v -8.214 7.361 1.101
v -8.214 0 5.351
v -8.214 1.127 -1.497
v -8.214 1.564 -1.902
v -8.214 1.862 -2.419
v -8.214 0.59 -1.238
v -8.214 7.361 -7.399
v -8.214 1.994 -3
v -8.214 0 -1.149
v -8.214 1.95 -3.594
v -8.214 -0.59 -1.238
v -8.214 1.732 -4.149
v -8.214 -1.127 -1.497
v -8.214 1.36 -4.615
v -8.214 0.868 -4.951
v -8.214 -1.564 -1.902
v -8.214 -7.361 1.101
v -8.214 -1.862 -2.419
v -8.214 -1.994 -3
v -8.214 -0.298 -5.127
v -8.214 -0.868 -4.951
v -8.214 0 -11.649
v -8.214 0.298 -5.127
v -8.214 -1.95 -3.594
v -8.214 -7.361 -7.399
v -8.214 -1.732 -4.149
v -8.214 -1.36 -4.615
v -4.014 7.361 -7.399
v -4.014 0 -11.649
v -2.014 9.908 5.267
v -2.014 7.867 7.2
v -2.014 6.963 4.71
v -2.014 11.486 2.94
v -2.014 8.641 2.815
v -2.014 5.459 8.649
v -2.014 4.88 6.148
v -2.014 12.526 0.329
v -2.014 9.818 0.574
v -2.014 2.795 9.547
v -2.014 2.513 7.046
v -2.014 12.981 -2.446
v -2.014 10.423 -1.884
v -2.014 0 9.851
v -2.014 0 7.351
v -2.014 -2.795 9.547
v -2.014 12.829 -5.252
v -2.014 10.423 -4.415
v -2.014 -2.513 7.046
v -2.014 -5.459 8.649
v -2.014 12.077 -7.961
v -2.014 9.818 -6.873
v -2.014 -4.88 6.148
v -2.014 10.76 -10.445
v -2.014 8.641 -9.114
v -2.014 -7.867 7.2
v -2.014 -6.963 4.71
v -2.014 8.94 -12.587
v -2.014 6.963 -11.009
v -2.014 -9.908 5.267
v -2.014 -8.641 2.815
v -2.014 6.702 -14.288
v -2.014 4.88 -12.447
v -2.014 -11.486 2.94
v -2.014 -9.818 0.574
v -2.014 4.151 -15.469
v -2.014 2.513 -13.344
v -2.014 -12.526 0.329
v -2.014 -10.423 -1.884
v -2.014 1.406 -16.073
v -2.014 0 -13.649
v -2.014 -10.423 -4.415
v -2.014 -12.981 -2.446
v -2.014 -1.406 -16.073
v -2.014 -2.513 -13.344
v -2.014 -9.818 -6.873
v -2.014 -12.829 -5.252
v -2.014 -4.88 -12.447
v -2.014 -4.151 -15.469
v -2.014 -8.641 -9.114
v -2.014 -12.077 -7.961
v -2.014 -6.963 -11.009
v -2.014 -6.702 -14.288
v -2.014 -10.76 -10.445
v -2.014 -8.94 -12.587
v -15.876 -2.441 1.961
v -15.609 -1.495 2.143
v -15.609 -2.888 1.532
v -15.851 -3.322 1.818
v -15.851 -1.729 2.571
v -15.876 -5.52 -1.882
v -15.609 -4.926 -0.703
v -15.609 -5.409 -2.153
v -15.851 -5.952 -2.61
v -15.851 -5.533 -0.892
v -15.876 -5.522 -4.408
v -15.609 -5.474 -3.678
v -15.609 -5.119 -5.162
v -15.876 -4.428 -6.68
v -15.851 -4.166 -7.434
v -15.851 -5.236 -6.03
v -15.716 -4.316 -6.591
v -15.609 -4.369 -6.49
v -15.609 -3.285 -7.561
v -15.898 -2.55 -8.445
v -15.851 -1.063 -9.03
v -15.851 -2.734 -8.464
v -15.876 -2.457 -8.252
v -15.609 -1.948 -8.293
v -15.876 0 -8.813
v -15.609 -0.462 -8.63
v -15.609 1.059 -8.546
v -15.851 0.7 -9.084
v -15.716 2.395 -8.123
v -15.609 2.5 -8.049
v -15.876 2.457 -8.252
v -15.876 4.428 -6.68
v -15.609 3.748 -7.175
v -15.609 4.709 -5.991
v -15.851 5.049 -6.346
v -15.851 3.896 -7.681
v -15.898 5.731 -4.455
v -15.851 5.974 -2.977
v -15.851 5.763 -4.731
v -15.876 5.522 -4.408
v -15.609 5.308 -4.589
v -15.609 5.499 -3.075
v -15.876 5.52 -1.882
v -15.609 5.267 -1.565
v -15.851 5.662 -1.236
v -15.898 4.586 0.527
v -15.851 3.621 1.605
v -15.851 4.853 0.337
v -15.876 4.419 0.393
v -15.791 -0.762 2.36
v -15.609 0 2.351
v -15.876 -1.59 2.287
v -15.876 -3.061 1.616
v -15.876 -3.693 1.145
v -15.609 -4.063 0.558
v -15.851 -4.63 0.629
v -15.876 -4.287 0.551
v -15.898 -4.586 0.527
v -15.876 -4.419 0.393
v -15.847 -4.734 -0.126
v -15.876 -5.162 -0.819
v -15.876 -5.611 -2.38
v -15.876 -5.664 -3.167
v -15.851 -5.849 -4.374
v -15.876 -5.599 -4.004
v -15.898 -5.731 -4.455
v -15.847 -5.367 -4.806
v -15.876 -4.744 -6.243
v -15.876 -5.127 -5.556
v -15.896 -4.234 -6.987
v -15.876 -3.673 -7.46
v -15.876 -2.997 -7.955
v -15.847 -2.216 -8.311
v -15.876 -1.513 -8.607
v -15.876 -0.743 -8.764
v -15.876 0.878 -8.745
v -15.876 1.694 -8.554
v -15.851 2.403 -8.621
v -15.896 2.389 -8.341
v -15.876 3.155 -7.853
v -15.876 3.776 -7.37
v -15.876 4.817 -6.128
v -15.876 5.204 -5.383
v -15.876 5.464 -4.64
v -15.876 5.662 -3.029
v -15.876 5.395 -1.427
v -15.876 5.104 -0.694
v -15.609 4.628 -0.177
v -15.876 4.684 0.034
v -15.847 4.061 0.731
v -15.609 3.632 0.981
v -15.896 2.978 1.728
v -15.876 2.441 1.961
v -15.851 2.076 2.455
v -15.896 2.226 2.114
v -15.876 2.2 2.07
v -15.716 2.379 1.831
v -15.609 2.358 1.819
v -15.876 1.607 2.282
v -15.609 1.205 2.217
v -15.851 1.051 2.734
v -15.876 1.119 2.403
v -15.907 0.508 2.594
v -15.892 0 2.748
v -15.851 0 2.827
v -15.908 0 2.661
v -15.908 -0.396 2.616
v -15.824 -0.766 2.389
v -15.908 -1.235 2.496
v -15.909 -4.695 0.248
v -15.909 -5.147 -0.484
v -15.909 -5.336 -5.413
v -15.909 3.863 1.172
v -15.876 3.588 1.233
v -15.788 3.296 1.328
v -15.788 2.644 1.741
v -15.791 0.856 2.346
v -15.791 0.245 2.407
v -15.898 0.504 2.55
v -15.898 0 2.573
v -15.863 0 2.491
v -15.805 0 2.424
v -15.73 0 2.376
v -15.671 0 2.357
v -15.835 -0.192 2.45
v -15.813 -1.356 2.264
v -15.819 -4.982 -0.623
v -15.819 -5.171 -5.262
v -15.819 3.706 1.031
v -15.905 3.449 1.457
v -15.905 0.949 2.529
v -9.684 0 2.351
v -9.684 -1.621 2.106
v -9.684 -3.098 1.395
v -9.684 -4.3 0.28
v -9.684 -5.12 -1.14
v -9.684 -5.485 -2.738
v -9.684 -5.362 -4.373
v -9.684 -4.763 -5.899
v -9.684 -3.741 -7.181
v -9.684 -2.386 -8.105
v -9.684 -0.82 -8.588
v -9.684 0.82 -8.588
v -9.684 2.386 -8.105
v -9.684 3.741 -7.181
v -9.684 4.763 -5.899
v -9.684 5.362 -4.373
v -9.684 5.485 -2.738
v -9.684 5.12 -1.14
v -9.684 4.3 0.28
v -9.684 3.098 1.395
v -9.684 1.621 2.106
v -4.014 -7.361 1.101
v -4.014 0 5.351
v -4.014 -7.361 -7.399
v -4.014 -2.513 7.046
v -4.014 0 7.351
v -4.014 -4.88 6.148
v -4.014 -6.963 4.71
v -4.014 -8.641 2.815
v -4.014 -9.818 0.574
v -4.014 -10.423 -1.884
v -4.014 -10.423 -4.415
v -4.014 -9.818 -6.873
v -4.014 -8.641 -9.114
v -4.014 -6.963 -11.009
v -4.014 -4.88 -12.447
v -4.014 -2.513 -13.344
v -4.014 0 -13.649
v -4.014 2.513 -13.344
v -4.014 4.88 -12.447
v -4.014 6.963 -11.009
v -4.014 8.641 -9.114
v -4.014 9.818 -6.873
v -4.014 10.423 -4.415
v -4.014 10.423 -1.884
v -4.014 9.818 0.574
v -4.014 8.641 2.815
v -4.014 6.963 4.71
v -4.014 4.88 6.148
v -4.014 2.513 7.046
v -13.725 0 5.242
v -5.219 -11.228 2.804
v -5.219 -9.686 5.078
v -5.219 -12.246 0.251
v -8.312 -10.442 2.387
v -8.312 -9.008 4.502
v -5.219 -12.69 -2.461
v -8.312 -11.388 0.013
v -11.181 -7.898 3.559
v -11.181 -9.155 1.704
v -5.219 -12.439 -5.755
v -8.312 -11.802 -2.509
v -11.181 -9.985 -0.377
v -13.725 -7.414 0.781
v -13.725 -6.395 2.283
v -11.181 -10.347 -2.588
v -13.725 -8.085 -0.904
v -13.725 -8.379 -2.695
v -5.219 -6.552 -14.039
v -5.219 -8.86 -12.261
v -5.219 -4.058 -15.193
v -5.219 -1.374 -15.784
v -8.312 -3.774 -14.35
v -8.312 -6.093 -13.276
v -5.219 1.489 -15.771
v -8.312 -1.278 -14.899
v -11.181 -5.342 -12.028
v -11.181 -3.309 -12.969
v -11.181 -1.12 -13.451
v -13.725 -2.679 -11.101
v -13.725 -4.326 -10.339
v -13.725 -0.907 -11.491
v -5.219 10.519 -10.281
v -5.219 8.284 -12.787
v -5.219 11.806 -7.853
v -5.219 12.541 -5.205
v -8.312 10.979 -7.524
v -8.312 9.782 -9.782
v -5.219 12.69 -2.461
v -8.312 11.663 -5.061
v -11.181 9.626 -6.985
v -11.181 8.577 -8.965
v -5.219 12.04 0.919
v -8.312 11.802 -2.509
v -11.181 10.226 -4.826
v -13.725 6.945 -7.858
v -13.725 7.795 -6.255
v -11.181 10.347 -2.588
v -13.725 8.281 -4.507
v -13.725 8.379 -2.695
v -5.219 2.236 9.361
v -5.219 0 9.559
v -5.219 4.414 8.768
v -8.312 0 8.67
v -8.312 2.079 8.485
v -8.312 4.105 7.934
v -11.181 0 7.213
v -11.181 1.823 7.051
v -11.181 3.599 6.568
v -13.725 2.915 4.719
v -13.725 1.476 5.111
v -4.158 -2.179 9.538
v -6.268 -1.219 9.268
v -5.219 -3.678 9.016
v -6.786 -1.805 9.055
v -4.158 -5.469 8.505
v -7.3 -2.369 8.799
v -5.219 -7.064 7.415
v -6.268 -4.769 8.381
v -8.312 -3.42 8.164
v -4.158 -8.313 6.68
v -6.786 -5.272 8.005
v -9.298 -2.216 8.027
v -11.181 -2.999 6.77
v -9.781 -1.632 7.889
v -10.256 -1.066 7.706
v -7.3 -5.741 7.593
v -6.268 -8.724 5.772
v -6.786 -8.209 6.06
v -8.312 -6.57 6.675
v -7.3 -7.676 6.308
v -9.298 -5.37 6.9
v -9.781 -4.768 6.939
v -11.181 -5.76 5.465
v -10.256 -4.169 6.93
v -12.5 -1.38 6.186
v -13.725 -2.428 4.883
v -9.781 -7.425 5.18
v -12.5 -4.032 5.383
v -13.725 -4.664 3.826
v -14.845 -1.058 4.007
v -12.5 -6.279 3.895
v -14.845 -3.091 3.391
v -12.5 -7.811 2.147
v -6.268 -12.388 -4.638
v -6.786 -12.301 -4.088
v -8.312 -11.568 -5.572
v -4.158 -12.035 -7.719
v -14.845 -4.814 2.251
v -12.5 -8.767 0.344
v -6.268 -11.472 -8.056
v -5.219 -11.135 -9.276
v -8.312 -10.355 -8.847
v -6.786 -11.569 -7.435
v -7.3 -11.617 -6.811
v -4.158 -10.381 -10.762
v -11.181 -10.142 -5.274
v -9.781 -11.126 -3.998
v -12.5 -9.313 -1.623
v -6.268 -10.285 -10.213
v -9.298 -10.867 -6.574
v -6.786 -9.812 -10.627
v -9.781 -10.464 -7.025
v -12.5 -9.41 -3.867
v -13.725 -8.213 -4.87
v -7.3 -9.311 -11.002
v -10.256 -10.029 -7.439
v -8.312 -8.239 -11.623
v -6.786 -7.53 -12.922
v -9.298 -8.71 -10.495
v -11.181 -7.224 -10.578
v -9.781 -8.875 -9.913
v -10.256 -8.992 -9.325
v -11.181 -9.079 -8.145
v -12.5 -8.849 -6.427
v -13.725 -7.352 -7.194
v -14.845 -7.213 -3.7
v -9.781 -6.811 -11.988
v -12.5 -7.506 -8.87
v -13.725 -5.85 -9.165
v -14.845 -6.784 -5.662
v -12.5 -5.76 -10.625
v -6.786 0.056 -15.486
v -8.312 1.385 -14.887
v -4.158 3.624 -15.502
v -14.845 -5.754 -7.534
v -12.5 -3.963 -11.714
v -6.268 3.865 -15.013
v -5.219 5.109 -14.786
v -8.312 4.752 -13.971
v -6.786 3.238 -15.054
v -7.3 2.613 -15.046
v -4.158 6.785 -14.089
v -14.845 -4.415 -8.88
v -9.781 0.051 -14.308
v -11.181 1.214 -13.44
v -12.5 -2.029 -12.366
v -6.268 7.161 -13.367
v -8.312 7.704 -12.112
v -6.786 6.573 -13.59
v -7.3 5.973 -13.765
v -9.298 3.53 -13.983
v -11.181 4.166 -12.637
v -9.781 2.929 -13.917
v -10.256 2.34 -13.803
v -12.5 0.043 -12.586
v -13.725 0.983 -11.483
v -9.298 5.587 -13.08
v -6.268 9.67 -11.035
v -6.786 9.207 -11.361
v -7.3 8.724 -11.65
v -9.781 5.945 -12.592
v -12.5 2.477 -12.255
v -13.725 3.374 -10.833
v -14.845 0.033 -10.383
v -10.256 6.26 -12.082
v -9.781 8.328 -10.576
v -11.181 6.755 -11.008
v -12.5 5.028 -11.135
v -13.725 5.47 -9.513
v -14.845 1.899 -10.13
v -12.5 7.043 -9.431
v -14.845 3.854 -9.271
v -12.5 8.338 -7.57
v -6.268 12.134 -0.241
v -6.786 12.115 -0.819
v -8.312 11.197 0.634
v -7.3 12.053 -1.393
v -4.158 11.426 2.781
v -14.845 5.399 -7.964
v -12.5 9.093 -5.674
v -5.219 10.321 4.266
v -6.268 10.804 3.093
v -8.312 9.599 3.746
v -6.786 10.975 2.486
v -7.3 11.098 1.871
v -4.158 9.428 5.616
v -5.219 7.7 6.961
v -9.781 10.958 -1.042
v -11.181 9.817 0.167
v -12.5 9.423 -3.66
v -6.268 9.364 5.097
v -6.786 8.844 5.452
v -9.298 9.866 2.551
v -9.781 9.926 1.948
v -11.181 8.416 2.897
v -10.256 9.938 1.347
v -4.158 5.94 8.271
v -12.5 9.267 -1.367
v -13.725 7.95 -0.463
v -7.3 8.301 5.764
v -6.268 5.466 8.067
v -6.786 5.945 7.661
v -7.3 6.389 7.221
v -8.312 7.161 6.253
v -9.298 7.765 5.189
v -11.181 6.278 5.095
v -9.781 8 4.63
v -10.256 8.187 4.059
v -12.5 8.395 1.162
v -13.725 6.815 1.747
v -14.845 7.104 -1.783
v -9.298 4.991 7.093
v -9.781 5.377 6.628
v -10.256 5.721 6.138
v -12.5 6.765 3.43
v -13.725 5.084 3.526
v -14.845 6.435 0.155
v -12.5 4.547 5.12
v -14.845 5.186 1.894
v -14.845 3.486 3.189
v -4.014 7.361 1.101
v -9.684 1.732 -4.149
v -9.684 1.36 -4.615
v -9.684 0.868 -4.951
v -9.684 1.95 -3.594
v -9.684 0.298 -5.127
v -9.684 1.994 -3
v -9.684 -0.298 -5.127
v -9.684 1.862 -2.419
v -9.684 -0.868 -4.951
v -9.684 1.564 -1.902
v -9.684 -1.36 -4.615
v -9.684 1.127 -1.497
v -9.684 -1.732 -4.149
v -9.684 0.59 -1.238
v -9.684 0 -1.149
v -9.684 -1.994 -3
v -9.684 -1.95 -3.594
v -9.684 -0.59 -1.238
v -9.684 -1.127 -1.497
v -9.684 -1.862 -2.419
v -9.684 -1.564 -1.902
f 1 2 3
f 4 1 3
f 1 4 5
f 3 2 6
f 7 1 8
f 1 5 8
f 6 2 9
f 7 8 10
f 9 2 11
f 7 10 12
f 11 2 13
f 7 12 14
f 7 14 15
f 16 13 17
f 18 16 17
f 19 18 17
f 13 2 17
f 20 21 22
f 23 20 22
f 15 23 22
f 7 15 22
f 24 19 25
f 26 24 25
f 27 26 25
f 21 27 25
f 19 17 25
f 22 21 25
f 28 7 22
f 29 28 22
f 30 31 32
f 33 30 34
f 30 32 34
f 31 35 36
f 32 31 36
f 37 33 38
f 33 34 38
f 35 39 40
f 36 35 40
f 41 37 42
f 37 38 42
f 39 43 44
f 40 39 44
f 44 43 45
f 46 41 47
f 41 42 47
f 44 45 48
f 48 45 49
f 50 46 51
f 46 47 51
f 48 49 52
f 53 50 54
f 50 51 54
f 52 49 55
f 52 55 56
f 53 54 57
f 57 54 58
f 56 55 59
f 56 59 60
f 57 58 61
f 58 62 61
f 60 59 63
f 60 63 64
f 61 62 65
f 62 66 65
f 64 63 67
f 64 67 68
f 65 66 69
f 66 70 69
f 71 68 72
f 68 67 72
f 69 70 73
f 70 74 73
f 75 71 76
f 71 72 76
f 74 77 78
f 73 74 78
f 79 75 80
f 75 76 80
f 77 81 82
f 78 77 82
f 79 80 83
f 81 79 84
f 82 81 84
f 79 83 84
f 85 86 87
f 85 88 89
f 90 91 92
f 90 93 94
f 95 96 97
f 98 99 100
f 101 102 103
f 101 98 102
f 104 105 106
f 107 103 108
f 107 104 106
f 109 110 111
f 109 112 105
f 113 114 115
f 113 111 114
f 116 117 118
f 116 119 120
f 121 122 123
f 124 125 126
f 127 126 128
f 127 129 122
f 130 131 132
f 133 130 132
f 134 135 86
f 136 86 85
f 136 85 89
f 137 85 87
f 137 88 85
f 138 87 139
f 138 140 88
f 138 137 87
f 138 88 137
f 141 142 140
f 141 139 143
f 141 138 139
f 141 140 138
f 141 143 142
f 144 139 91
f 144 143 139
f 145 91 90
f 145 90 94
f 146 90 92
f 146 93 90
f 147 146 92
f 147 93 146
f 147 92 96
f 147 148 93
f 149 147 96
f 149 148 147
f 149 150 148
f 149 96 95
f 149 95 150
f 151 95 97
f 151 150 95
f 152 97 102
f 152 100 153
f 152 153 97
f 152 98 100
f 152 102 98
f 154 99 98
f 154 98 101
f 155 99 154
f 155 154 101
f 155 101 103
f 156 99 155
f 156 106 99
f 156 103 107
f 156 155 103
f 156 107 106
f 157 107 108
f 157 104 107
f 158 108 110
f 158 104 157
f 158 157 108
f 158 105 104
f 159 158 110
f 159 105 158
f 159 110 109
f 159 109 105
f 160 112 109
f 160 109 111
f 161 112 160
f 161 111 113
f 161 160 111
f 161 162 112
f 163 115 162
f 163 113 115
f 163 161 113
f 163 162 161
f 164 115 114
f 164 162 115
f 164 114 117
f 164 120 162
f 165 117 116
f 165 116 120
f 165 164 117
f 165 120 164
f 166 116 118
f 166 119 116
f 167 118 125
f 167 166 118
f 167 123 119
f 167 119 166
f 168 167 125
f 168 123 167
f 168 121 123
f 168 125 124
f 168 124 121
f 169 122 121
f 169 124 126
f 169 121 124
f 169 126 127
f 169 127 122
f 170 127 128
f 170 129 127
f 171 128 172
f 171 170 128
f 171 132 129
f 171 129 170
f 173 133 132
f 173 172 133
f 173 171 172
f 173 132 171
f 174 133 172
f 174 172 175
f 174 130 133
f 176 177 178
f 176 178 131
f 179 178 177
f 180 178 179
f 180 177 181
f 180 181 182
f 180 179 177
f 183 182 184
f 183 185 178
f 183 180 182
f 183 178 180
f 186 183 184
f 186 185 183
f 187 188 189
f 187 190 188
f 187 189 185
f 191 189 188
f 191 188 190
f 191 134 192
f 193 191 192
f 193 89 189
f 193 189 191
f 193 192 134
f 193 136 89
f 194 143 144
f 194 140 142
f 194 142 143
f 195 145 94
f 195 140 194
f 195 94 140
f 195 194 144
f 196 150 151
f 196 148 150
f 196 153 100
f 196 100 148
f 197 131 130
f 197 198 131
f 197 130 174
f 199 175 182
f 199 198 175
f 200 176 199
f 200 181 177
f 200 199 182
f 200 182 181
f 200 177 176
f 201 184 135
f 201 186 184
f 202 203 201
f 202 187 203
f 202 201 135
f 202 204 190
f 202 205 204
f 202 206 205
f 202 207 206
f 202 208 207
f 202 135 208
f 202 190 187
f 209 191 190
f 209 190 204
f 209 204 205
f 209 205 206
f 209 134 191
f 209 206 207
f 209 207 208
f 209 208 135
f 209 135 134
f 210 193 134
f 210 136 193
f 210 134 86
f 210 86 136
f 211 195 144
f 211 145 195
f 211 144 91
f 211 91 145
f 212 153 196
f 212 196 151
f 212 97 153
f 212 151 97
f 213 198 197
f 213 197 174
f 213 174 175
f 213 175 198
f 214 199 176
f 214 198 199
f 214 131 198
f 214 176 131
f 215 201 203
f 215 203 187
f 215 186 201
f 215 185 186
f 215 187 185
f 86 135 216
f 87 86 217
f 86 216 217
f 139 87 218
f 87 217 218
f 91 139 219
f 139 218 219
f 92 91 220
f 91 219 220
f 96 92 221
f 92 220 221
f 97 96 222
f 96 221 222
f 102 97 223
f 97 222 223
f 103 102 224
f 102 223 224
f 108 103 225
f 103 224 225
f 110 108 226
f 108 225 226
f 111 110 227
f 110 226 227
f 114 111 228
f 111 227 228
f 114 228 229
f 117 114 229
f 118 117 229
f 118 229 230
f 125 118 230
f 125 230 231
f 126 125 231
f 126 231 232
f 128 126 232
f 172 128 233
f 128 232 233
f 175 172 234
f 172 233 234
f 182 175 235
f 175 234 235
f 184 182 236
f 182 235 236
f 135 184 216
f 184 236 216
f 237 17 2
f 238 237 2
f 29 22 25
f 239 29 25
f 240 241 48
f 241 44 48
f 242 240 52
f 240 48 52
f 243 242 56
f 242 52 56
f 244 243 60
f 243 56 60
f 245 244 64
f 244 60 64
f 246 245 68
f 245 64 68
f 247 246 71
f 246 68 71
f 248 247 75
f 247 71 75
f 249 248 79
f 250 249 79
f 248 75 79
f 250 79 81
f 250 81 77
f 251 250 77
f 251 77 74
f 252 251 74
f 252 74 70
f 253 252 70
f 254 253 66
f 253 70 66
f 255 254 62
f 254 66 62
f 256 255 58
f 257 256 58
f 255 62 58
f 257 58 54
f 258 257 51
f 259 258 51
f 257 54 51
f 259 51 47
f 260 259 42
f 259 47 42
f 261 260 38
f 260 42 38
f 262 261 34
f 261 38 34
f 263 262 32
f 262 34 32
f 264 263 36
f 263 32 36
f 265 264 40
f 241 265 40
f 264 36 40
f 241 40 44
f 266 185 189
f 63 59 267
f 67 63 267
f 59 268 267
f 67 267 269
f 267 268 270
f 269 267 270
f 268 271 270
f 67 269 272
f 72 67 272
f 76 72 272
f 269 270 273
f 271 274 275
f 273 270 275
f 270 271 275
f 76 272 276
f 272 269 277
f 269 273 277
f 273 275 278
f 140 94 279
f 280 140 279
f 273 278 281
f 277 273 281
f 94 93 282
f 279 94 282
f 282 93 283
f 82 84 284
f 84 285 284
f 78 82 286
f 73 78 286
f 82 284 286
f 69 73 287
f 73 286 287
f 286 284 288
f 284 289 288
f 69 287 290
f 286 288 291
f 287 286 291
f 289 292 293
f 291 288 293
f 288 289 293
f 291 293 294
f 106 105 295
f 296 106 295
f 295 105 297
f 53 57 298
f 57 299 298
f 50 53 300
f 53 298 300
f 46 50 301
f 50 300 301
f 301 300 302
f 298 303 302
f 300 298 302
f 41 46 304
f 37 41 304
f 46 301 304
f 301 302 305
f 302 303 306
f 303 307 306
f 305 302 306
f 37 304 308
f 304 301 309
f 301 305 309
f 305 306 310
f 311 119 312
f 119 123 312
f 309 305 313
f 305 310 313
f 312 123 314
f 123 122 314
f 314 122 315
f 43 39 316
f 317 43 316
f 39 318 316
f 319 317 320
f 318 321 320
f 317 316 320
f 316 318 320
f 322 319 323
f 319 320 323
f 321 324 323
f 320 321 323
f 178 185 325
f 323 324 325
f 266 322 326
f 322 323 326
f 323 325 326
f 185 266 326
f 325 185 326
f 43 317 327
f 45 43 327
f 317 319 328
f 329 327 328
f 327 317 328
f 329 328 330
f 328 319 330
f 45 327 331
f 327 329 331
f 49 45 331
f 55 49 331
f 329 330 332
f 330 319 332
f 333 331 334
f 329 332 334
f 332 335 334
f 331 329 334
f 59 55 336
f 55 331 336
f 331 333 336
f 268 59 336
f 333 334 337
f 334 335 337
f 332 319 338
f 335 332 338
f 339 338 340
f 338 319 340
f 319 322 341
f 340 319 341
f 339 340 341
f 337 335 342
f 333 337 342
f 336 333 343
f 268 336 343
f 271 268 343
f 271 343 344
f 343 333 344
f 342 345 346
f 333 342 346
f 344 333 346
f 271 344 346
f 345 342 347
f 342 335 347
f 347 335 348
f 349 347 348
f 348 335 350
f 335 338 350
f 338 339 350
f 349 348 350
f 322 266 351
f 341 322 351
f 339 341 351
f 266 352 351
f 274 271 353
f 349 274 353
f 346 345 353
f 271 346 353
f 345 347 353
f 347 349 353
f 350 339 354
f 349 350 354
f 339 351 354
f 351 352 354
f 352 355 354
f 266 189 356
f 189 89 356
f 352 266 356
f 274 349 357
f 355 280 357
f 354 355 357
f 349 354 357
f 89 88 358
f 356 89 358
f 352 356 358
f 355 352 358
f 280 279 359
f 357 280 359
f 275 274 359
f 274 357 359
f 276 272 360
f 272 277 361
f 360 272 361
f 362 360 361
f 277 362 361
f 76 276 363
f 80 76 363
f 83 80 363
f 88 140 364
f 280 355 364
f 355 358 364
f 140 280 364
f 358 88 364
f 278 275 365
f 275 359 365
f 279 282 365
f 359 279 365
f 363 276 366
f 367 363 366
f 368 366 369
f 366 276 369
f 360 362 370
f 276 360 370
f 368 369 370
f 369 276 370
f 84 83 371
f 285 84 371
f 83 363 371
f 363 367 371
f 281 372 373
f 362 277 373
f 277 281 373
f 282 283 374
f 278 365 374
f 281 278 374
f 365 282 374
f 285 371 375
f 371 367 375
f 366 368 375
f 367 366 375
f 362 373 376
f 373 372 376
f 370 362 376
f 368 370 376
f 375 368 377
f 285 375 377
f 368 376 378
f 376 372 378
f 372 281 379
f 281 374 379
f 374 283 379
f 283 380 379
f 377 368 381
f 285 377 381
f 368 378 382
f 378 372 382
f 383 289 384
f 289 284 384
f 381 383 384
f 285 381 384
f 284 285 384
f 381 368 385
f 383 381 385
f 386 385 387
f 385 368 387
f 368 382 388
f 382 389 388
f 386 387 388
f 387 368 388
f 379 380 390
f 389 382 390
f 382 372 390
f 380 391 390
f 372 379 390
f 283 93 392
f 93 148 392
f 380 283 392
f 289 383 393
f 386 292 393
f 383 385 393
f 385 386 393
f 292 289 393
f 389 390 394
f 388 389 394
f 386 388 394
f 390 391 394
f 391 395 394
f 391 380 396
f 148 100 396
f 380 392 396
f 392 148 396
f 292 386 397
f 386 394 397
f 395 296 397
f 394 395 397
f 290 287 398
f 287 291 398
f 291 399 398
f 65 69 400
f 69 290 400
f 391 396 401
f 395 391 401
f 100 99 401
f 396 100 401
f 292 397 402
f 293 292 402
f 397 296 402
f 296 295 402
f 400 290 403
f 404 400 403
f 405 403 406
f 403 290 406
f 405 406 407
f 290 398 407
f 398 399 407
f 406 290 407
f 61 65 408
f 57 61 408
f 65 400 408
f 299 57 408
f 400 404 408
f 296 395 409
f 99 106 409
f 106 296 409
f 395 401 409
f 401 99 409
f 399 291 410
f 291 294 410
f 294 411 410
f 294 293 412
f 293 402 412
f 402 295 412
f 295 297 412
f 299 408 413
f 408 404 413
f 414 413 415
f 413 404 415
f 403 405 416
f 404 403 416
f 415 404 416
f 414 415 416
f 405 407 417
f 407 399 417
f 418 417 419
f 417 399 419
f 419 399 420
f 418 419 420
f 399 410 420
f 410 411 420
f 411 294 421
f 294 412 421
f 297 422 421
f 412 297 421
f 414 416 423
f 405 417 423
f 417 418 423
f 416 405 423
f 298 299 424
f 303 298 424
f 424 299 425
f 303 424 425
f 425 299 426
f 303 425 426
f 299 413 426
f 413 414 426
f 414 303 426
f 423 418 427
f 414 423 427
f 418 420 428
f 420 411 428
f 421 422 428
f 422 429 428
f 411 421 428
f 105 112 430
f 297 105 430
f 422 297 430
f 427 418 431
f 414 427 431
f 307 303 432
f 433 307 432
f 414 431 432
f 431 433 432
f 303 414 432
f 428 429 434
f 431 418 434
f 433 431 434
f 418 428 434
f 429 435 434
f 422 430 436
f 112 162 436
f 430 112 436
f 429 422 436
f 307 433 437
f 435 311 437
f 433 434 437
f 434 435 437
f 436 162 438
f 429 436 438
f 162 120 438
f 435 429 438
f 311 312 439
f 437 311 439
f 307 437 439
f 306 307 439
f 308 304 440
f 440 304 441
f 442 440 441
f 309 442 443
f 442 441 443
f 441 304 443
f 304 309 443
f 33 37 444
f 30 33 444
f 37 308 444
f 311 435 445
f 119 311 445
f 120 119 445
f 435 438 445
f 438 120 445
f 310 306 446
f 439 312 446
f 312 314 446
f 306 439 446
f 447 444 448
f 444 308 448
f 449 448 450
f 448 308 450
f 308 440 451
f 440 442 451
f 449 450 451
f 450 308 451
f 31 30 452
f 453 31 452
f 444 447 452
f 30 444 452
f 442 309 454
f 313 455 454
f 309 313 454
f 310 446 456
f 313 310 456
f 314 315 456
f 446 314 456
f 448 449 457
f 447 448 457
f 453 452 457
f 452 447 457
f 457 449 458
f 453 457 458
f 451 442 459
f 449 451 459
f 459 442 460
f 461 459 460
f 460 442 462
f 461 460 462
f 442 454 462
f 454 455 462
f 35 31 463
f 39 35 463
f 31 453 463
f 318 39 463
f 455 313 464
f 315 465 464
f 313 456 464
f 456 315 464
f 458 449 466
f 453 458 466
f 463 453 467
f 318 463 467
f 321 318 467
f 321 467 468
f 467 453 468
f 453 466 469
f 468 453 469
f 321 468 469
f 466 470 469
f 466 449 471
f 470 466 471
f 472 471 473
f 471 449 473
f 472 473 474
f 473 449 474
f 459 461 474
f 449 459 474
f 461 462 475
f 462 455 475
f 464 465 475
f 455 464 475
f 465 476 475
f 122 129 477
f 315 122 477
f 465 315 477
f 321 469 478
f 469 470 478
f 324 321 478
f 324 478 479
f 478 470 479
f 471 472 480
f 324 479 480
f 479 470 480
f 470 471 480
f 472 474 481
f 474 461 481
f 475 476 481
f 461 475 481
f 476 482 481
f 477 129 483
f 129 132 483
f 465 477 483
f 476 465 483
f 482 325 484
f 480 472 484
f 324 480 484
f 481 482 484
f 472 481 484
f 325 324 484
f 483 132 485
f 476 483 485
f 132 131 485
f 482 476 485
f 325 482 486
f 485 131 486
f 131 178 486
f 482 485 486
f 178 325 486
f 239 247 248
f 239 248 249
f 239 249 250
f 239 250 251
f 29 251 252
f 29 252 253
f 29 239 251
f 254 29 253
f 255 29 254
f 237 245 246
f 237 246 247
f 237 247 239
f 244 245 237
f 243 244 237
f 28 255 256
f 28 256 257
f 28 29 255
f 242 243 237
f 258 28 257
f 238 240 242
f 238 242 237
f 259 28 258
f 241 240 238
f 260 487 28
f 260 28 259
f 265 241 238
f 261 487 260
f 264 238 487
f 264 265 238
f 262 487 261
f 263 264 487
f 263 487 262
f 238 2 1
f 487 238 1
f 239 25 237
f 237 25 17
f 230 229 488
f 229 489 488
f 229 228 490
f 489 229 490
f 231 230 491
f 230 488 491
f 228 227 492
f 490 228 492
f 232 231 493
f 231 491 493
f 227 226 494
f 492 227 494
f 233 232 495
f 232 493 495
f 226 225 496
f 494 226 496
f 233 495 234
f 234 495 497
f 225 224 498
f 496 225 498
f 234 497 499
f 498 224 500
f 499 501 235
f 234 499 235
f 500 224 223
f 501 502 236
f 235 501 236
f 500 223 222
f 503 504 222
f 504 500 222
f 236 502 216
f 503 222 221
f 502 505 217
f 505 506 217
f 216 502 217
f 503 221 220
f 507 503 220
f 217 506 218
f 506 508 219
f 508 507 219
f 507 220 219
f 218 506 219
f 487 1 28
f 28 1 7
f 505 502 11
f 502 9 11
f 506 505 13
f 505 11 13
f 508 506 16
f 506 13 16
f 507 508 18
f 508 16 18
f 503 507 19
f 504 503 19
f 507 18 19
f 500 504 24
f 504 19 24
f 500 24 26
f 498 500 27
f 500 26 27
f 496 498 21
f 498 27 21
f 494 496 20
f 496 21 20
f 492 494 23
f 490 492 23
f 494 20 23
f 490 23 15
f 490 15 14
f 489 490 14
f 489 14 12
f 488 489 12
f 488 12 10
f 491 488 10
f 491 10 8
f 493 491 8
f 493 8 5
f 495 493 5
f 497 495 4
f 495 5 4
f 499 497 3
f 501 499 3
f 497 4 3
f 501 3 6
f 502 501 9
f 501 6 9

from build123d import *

# Parameters (mm, degrees)
F2_R     = 0.3
F4_DEPTH = 4.2


with BuildPart() as f1:
    # F0 (on Front) → F1 (revolve)
    with BuildSketch(Plane.XZ):
        with BuildLine():
            ThreePointArc((-2.0143112539, 9.8506723092), (-10.0387856326, 7.8756525688), (-16.1843112539, 2.3506723092))
            Line((-16.1843112539, 2.3506723092), (-9.6843112539, 2.3506723092))
            Line((-9.6843112539, 2.3506723092), (-9.6843112539, -1.1493276908))
            Line((-9.6843112539, -1.1493276908), (-8.2143112539, -1.1493276908))
            Line((-8.2143112539, -1.1493276908), (-8.2143112539, 5.3506723092))
            Line((-8.2143112539, 5.3506723092), (-4.0143112539, 5.3506723092))
            Line((-4.0143112539, 5.3506723092), (-4.0143112539, 7.3506723092))
            Line((-4.0143112539, 7.3506723092), (-2.0143112539, 7.3506723092))
            Line((-2.0143112539, 7.3506723092), (-2.0143112539, 9.8506723092))
        make_face()
    revolve(axis=Axis((-7.483886322, 0, -3.1493276908), (1, 0, 0)))

    # F2
    f2_edges = [f1.edges().sort_by_distance(p)[0] for p in [
        (-16.184311, 0, -8.649328),
    ]]
    fillet(f2_edges, radius=F2_R)

    # F3 (on face) → F4 (join)
    with BuildSketch(Plane.YZ.offset(-8.2143112539)):
        with BuildLine():
            Line((-7.3612159322, 1.1006723092), (0, 5.3506723092))
            ThreePointArc((0, 5.3506723092), (-4.25, 4.2118882414), (-7.3612159322, 1.1006723092))
        make_face()
        with BuildLine():
            Line((0, 5.3506723092), (7.3612159322, 1.1006723092))
            ThreePointArc((7.3612159322, 1.1006723092), (4.25, 4.2118882414), (0, 5.3506723092))
        make_face()
        with BuildLine():
            ThreePointArc((7.3612159322, -7.3993276908), (8.2103695235, -5.3492895741), (8.5, -3.1493276908))
            ThreePointArc((8.5, -3.1493276908), (8.2103695235, -0.9493658074), (7.3612159322, 1.1006723092))
            Line((7.3612159322, 1.1006723092), (7.3612159322, -7.3993276908))
        make_face()
        with BuildLine():
            Line((-7.3612159322, -7.3993276908), (-7.3612159322, 1.1006723092))
            ThreePointArc((-7.3612159322, 1.1006723092), (-8.5, -3.1493276908), (-7.3612159322, -7.3993276908))
        make_face()
        with BuildLine():
            ThreePointArc((-7.3612159322, -7.3993276908), (-4.25, -10.5105436229), (0, -11.6493276908))
            Line((0, -11.6493276908), (-7.3612159322, -7.3993276908))
        make_face()
        with BuildLine():
            ThreePointArc((0, -11.6493276908), (4.25, -10.5105436229), (7.3612159322, -7.3993276908))
            Line((7.3612159322, -7.3993276908), (0, -11.6493276908))
        make_face()
    extrude(amount=F4_DEPTH)


solid = f1.part
